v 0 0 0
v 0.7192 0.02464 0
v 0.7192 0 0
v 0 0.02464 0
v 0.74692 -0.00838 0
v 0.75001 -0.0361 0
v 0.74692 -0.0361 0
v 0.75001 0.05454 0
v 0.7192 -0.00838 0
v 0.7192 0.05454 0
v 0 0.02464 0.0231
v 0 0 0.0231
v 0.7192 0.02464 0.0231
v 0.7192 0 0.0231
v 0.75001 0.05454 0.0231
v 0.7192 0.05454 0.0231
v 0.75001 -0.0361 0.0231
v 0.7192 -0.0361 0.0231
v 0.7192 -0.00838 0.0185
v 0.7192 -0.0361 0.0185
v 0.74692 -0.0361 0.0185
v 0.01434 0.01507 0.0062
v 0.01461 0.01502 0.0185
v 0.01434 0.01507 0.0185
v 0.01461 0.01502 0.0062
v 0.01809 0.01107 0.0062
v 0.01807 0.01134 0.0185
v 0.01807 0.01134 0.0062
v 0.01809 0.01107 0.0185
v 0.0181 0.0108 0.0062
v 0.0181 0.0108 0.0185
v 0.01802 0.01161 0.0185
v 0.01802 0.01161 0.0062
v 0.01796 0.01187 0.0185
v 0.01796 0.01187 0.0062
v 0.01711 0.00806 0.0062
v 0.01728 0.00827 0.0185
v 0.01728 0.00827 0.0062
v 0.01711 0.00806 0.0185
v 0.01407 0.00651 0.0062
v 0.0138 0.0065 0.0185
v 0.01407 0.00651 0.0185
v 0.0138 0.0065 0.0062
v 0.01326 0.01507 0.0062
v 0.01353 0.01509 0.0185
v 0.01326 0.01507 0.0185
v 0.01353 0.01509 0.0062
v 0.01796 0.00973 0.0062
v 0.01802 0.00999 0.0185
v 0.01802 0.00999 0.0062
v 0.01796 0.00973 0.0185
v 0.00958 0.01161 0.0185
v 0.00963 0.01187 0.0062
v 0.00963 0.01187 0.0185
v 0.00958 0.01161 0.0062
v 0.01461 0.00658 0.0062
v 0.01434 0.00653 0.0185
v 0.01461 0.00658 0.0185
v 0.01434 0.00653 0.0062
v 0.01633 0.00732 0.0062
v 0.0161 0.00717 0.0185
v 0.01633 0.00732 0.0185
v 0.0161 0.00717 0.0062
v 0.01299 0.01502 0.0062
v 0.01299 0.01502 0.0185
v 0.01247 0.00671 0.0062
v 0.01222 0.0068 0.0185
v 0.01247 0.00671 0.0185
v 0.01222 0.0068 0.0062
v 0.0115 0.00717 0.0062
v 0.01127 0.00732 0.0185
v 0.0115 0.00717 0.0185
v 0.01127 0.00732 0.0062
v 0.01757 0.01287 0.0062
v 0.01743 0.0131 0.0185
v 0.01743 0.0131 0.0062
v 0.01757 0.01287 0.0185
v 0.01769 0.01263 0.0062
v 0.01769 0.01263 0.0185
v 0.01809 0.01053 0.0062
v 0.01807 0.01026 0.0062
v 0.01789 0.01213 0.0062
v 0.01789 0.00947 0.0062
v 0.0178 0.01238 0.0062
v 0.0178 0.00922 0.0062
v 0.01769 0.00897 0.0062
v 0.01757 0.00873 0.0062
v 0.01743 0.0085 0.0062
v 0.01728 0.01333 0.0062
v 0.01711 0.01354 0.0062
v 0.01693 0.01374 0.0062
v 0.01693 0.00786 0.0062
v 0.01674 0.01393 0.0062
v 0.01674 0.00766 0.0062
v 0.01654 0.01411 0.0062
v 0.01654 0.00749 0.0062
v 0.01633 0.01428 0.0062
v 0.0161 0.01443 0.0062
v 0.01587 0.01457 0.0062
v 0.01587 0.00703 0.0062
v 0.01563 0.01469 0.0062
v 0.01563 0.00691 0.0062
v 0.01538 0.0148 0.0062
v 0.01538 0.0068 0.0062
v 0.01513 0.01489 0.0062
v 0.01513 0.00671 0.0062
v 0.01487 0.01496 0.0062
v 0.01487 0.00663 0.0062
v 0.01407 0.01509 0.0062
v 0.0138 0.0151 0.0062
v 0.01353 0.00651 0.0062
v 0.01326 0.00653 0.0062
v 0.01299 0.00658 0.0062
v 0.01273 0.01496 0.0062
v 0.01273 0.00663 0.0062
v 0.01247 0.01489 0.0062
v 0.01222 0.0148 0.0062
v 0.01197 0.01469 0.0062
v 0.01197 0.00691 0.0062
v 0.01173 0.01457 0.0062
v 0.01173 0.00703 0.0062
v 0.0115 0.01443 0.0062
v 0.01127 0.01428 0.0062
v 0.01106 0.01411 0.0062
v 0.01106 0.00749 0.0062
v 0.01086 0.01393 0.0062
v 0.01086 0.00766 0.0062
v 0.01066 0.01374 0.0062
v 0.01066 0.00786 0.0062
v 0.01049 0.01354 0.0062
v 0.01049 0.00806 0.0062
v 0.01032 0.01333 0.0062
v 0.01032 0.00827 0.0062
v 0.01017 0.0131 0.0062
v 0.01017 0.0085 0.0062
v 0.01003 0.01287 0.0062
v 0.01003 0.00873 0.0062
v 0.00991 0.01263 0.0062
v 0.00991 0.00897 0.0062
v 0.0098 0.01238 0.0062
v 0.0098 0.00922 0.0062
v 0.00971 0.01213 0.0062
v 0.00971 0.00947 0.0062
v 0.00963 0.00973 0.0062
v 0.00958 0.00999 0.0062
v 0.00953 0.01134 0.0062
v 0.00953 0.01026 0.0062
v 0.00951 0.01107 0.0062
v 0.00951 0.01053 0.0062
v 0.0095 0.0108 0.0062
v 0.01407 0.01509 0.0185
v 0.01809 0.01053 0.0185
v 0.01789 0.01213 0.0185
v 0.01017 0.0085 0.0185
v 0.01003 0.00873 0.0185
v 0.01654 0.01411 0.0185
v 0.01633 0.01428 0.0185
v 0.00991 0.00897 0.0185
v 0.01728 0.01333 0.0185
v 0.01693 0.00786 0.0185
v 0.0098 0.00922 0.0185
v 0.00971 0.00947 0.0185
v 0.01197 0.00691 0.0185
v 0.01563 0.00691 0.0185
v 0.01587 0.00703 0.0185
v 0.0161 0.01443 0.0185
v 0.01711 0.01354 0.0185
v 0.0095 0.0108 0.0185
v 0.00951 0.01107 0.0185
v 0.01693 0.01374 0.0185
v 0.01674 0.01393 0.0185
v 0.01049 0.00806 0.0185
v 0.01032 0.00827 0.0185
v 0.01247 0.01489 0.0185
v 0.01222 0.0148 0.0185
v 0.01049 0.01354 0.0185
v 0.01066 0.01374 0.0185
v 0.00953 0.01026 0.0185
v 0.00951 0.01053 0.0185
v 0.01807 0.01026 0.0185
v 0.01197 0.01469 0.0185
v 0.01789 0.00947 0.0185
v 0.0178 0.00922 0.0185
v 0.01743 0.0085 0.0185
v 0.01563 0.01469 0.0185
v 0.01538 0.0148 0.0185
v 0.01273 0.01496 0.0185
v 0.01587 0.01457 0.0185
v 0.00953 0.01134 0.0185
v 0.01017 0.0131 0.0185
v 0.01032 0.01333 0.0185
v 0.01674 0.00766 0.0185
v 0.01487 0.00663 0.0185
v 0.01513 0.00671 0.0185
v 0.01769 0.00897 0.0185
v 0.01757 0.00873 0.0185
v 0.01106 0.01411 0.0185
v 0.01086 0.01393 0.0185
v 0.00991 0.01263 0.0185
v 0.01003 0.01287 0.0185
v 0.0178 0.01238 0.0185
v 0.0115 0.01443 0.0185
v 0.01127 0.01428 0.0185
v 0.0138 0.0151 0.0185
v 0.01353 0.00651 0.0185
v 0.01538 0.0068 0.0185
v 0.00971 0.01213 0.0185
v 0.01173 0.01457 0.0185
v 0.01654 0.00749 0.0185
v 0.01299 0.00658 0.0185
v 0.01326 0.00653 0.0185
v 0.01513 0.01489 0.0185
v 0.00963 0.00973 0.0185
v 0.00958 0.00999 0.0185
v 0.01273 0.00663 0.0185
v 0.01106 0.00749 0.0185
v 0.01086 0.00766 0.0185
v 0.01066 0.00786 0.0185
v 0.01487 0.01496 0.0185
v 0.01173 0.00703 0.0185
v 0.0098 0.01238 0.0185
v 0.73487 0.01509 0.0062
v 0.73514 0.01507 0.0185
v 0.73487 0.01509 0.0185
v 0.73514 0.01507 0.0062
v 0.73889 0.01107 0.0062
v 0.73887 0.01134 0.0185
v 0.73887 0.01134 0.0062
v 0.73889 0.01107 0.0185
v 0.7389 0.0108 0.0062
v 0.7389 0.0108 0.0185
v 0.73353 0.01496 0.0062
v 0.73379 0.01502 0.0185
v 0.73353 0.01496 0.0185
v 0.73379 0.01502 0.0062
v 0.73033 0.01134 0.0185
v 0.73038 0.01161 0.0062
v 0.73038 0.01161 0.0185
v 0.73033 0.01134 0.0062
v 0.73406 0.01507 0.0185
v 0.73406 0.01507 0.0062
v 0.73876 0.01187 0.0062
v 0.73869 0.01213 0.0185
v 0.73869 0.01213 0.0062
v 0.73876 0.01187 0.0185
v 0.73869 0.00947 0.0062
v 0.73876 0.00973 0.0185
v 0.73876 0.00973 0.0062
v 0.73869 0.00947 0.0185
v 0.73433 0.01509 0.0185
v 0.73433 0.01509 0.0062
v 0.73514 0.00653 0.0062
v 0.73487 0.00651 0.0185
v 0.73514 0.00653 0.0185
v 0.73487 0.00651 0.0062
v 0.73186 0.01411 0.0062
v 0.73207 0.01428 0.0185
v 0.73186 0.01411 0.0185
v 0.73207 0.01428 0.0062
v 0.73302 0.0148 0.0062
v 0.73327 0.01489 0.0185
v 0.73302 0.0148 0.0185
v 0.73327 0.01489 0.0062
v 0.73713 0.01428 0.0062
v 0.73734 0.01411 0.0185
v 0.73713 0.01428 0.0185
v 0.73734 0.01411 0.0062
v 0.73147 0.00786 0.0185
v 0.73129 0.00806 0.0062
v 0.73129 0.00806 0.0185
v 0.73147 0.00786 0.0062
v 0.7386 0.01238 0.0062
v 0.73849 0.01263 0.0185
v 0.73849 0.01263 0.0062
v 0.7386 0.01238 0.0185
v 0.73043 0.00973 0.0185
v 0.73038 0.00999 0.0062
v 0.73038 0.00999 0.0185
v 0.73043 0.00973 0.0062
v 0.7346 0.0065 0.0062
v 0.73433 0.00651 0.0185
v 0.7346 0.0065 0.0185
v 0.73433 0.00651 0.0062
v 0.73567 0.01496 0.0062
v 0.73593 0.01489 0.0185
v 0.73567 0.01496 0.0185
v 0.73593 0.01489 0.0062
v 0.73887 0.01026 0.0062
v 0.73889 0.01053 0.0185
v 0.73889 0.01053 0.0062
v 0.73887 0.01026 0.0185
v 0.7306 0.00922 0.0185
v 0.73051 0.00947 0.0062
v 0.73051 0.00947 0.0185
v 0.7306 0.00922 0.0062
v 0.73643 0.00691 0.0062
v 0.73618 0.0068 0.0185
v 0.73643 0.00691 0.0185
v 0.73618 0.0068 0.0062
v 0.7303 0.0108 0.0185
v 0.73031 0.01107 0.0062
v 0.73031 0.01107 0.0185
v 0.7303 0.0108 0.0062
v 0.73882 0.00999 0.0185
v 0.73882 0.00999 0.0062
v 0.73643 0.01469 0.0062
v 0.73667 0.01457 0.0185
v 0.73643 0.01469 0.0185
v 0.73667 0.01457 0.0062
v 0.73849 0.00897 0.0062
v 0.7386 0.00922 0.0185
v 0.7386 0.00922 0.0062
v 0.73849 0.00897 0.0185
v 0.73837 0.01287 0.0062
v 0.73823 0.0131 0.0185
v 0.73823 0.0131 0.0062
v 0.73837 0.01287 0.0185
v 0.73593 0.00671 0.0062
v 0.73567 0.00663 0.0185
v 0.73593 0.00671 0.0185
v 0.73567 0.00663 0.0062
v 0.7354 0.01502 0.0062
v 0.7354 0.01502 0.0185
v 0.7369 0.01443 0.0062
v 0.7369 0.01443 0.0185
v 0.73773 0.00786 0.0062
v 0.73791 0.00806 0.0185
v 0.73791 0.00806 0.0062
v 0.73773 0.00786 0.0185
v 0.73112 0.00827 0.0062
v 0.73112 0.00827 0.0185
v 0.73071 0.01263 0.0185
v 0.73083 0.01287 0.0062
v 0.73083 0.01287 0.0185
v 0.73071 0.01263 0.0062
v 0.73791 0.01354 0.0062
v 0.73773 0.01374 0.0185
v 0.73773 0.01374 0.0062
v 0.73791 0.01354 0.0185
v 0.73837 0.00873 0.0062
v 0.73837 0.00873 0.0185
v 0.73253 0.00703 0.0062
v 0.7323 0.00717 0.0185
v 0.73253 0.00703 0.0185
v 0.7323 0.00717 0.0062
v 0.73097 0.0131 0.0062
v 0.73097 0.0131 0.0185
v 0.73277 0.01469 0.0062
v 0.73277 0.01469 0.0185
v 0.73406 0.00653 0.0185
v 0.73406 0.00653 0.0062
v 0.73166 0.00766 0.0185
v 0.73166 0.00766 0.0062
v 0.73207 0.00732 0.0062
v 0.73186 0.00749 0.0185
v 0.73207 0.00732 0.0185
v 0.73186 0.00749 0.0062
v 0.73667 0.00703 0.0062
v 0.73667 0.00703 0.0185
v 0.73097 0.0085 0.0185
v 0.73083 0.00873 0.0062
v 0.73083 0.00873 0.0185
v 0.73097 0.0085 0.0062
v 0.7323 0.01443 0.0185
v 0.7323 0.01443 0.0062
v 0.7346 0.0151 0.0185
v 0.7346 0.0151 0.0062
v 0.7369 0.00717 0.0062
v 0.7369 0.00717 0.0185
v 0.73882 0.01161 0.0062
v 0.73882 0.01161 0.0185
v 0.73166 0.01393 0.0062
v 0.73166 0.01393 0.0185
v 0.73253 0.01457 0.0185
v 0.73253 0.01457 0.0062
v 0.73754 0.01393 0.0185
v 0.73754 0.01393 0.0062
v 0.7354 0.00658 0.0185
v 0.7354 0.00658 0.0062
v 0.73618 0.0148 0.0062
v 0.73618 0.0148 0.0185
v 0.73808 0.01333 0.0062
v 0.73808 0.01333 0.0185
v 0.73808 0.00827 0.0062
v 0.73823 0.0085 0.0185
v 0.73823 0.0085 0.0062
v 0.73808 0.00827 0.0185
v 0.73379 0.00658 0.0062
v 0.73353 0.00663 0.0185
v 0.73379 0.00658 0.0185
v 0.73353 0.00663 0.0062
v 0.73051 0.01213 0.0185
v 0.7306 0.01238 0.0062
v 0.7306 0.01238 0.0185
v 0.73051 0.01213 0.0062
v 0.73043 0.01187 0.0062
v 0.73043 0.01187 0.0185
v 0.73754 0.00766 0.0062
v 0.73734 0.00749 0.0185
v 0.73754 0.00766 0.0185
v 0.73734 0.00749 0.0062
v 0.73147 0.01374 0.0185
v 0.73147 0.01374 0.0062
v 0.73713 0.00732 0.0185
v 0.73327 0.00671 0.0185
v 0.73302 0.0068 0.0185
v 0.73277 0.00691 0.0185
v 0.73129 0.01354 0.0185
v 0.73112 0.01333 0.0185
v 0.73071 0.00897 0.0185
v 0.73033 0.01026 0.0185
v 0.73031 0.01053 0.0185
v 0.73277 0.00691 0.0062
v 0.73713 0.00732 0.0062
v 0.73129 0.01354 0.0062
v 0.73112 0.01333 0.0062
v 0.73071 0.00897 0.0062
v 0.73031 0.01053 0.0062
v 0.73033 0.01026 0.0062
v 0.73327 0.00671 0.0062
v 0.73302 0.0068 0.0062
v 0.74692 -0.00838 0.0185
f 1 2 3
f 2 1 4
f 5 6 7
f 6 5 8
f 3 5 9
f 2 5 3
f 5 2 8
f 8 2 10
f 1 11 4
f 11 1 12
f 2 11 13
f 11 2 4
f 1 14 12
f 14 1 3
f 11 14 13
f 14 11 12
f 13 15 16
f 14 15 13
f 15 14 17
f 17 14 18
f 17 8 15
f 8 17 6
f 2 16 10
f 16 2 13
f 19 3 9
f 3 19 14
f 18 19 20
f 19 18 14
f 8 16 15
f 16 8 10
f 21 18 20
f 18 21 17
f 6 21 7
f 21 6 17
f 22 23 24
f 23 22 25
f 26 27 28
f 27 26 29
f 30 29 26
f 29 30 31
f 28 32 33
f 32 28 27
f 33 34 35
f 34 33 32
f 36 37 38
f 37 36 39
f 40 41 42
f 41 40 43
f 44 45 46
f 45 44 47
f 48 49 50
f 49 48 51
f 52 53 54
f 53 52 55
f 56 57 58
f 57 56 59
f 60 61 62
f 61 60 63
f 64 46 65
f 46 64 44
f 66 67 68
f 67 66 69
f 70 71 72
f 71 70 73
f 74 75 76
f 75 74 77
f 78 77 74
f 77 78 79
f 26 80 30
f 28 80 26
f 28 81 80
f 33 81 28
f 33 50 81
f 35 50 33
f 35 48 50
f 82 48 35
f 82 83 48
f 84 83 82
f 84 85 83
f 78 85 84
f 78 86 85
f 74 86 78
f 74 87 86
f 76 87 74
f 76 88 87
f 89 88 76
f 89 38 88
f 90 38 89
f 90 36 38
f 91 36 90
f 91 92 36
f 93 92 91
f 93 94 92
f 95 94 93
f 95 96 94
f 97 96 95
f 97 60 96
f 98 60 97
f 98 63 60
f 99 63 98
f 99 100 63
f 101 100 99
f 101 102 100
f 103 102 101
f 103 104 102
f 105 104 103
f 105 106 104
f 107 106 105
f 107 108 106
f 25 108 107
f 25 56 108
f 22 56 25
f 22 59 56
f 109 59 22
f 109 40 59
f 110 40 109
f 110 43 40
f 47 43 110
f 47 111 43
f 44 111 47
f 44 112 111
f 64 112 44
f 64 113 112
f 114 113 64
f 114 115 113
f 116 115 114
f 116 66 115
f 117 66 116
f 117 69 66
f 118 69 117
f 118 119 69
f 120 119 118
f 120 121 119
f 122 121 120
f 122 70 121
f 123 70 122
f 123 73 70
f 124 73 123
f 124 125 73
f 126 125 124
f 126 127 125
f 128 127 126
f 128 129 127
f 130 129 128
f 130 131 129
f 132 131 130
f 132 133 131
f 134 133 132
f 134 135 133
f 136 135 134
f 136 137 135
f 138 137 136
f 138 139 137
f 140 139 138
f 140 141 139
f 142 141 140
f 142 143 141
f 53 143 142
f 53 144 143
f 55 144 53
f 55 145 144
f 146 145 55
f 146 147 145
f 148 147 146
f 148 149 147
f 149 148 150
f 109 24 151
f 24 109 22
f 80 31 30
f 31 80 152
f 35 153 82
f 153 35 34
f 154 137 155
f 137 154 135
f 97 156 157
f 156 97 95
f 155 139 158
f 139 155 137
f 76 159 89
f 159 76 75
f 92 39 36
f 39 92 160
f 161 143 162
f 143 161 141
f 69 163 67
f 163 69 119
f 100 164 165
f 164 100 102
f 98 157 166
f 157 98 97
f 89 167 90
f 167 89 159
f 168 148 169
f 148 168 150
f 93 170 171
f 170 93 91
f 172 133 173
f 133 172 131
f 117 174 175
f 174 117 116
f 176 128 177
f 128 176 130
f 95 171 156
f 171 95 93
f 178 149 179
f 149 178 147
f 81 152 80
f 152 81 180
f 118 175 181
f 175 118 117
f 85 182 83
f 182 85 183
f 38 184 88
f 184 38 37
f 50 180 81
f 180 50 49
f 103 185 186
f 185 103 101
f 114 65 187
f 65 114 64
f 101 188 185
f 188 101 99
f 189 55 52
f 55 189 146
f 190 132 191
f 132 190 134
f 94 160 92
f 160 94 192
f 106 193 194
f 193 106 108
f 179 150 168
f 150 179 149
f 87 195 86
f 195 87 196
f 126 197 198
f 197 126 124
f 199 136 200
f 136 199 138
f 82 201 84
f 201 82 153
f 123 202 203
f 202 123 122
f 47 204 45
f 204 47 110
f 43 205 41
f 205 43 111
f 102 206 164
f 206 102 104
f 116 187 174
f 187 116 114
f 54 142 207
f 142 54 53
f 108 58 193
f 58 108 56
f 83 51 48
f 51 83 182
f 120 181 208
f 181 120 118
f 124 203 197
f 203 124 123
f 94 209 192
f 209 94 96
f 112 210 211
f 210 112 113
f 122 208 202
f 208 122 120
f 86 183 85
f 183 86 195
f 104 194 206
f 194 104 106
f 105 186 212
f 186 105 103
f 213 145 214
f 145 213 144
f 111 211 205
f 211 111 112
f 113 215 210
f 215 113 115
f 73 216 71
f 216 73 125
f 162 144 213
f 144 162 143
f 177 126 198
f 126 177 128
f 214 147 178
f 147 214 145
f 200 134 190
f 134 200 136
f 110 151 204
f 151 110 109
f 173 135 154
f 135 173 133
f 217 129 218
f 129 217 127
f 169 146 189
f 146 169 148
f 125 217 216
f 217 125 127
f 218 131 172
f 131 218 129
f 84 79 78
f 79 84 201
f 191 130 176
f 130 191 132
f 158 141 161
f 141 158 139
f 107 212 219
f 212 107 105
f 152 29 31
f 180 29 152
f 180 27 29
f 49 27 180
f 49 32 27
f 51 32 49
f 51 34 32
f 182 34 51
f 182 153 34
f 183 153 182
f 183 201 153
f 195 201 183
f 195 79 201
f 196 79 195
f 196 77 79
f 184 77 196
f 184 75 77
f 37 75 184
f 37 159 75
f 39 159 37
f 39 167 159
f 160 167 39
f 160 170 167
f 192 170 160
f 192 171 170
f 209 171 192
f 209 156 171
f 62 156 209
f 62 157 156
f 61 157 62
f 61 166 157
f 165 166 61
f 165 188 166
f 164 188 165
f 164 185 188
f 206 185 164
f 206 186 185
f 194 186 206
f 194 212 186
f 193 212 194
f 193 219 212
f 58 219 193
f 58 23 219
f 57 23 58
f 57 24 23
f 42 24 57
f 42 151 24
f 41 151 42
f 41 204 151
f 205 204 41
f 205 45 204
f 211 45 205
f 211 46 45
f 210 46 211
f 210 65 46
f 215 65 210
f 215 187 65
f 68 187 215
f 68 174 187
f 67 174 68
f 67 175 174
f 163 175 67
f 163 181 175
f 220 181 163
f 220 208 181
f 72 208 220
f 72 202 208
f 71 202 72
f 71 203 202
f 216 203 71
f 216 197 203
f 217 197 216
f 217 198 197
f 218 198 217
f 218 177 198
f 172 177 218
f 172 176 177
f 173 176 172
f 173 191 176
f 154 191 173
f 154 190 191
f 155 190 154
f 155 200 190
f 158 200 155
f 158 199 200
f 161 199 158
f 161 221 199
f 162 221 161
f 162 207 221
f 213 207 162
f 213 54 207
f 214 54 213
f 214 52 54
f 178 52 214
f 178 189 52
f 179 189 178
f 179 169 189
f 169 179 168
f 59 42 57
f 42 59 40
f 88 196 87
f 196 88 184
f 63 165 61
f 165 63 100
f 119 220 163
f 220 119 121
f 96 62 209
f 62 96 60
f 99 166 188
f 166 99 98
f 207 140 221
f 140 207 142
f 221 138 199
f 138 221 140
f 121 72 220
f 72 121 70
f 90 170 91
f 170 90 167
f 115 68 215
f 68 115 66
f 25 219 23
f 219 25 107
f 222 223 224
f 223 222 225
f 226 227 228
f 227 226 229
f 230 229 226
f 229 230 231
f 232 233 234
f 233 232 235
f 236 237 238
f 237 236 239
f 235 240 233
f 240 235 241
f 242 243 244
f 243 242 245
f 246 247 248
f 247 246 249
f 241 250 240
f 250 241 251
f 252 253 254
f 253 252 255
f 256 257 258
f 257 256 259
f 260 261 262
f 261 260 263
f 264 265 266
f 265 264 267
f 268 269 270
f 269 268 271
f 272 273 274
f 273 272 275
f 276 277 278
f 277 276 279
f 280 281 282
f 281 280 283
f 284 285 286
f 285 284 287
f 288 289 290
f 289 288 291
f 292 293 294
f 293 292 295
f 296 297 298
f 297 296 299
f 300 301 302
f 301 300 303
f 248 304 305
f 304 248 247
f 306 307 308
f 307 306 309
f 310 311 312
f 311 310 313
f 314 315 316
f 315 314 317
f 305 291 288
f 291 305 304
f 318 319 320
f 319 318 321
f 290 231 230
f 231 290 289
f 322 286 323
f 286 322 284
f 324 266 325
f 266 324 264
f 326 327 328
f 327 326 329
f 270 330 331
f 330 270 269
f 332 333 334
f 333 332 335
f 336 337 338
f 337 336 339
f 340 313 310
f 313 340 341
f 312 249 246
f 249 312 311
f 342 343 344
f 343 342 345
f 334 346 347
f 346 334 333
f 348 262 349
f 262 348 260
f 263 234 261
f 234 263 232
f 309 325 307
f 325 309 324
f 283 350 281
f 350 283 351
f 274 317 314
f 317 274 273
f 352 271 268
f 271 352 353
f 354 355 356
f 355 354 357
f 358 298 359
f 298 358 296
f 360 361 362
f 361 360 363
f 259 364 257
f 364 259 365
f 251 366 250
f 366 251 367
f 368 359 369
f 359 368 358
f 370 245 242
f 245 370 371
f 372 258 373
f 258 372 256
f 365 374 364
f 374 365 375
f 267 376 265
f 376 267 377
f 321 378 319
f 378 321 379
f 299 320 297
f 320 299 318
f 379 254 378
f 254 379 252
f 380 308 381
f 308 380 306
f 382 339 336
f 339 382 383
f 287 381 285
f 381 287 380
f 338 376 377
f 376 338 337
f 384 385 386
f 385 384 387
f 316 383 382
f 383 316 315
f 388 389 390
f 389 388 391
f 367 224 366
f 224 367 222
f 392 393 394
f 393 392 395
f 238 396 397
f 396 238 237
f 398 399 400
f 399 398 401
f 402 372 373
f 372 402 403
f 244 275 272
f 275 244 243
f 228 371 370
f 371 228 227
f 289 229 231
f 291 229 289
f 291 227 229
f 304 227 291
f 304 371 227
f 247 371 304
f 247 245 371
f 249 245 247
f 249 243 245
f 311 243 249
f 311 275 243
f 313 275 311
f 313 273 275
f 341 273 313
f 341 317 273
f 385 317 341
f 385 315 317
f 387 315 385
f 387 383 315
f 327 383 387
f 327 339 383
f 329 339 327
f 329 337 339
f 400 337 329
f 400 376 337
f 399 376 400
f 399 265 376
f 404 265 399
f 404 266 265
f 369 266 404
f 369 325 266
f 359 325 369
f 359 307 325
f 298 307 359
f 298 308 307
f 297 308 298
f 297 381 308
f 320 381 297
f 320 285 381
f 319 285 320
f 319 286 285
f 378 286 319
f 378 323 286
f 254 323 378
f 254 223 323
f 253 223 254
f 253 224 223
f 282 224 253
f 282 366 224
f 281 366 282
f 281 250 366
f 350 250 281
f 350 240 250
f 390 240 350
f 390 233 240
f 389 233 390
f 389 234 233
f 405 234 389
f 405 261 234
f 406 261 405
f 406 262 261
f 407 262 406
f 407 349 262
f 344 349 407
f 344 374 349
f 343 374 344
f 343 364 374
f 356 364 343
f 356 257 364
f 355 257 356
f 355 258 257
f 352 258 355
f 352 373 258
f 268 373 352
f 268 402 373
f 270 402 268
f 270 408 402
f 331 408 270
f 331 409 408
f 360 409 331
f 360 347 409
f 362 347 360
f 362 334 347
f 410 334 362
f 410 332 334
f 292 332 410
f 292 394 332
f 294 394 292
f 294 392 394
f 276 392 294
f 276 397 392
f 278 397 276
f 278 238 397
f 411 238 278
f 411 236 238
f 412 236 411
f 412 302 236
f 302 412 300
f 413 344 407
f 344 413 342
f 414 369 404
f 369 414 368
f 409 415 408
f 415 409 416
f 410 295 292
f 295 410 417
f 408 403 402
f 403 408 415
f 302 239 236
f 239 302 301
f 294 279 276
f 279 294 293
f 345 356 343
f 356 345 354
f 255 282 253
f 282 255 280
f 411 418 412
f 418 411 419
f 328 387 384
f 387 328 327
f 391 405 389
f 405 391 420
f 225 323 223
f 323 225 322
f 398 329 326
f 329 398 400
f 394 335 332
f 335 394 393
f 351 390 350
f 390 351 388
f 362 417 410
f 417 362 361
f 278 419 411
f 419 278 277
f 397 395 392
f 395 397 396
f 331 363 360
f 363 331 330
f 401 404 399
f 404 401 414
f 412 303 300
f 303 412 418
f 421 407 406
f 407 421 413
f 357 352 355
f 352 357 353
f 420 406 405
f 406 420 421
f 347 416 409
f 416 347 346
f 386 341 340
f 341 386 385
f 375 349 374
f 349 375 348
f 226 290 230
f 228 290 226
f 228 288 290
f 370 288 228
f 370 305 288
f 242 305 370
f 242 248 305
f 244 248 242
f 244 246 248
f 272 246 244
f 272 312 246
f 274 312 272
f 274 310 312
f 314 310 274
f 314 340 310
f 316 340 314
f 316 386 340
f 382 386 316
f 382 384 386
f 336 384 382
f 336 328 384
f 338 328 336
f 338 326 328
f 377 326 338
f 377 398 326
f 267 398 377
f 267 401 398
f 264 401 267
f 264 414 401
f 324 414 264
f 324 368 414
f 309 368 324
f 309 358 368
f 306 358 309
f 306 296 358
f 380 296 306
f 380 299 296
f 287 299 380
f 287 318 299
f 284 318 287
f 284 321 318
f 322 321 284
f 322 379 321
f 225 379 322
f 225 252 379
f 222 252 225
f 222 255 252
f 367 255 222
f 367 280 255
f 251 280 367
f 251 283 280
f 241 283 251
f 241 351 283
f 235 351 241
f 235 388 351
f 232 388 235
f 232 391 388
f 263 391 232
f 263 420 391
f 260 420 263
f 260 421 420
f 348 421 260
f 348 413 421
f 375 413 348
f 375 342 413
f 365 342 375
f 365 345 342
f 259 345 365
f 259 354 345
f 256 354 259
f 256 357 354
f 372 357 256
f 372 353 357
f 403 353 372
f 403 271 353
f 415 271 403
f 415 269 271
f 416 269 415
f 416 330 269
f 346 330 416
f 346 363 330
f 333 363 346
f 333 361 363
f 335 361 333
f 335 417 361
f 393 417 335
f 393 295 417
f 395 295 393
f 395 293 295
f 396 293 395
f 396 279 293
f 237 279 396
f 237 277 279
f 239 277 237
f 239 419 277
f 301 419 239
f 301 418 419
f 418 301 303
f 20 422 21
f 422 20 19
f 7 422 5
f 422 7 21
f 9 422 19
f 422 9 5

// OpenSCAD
// ============================================================
// Parametric Model: Rectangular Rail with End Block, Recesses, and Cutouts
// ============================================================

// --- Rail dimensions ---
rail_length      = 0.748506;
rail_width       = 0.024642;
rail_lower_h     = 0.0185;    // lower body extrusion depth
rail_top_h       = 0.0046;    // top layer extrusion depth
rail_top_thick   = 0.00462;   // top layer nominal thickness

// --- Circular recess parameters (rail & end block) ---
recess_r         = 0.0043;    // radius of all circular recesses
recess_y_offset  = 0.0108;    // center offset from front edge
recess_x1        = 0.0138;    // rail recess 1 center from left end
recess_x2        = 0.7346;    // rail recess 2 center from left end
recess_z_bot     = 0.0062;    // bottom of recess band above base
recess_z_top     = 0.0185;    // top of recess band above base
recess_depth     = 0.0123;    // vertical extent of recess band

// --- End block position and size ---
end_x_left       = 0.7192;                     // left edge from rail left end
end_x_right      = 0.748506 + 0.0015;          // right edge = rail right + 0.0015
end_y_front      = -0.0361;                     // front edge (in front of rail front)
end_y_back       = 0.024642 + 0.0299;          // back edge (beyond rail back)
end_lower_h      = 0.0185;                     // same lower body extrusion depth
end_top_h        = 0.0046;                     // same top layer extrusion depth
end_top_thick    = 0.00462;                    // same top layer nominal thickness

// --- End block circular recess ---
end_recess_x     = 0.7361;    // center from rail left end
end_recess_y     = -0.0192;   // center in front of rail front edge

// --- Rectangular cutout in end block ---
cutout_side      = 0.027722;  // equal-sided square cutout
cutout_z_top     = 0.0185;    // top of cutout (at lower body top)
cutout_z_bot     = -0.0585;   // bottom of cutout (below base underside)
cutout_depth     = 0.077;     // total reach of cutout

// --- Resolution ---
$fn = 100;

// ============================================================
// Main Model
// ============================================================

difference() {
    union() {
        // ---- Rail lower body ----
        cube([rail_length, rail_width, rail_lower_h]);

        // ---- Rail shallow top layer ----
        translate([0, 0, rail_lower_h])
            cube([rail_length, rail_width, rail_top_h]);

        // ---- End block lower body ----
        translate([end_x_left, end_y_front, 0])
            cube([end_x_right - end_x_left,
                  end_y_back - end_y_front,
                  end_lower_h]);

        // ---- End block shallow top layer ----
        translate([end_x_left, end_y_front, end_lower_h])
            cube([end_x_right - end_x_left,
                  end_y_back - end_y_front,
                  end_top_h]);
    }

    // ---- Rail circular recess 1 ----
    translate([recess_x1, recess_y_offset, recess_z_bot])
        cylinder(h=recess_depth, r=recess_r);

    // ---- Rail circular recess 2 ----
    translate([recess_x2, recess_y_offset, recess_z_bot])
        cylinder(h=recess_depth, r=recess_r);

    // ---- End block circular recess ----
    translate([end_recess_x, end_recess_y, recess_z_bot])
        cylinder(h=recess_depth, r=recess_r);

    // ---- Deep rectangular cutout in end block ----
    // Shares end block left edge and front edge
    translate([end_x_left, end_y_front, cutout_z_bot])
        cube([cutout_side, cutout_side, cutout_z_top - cutout_z_bot]);
}
